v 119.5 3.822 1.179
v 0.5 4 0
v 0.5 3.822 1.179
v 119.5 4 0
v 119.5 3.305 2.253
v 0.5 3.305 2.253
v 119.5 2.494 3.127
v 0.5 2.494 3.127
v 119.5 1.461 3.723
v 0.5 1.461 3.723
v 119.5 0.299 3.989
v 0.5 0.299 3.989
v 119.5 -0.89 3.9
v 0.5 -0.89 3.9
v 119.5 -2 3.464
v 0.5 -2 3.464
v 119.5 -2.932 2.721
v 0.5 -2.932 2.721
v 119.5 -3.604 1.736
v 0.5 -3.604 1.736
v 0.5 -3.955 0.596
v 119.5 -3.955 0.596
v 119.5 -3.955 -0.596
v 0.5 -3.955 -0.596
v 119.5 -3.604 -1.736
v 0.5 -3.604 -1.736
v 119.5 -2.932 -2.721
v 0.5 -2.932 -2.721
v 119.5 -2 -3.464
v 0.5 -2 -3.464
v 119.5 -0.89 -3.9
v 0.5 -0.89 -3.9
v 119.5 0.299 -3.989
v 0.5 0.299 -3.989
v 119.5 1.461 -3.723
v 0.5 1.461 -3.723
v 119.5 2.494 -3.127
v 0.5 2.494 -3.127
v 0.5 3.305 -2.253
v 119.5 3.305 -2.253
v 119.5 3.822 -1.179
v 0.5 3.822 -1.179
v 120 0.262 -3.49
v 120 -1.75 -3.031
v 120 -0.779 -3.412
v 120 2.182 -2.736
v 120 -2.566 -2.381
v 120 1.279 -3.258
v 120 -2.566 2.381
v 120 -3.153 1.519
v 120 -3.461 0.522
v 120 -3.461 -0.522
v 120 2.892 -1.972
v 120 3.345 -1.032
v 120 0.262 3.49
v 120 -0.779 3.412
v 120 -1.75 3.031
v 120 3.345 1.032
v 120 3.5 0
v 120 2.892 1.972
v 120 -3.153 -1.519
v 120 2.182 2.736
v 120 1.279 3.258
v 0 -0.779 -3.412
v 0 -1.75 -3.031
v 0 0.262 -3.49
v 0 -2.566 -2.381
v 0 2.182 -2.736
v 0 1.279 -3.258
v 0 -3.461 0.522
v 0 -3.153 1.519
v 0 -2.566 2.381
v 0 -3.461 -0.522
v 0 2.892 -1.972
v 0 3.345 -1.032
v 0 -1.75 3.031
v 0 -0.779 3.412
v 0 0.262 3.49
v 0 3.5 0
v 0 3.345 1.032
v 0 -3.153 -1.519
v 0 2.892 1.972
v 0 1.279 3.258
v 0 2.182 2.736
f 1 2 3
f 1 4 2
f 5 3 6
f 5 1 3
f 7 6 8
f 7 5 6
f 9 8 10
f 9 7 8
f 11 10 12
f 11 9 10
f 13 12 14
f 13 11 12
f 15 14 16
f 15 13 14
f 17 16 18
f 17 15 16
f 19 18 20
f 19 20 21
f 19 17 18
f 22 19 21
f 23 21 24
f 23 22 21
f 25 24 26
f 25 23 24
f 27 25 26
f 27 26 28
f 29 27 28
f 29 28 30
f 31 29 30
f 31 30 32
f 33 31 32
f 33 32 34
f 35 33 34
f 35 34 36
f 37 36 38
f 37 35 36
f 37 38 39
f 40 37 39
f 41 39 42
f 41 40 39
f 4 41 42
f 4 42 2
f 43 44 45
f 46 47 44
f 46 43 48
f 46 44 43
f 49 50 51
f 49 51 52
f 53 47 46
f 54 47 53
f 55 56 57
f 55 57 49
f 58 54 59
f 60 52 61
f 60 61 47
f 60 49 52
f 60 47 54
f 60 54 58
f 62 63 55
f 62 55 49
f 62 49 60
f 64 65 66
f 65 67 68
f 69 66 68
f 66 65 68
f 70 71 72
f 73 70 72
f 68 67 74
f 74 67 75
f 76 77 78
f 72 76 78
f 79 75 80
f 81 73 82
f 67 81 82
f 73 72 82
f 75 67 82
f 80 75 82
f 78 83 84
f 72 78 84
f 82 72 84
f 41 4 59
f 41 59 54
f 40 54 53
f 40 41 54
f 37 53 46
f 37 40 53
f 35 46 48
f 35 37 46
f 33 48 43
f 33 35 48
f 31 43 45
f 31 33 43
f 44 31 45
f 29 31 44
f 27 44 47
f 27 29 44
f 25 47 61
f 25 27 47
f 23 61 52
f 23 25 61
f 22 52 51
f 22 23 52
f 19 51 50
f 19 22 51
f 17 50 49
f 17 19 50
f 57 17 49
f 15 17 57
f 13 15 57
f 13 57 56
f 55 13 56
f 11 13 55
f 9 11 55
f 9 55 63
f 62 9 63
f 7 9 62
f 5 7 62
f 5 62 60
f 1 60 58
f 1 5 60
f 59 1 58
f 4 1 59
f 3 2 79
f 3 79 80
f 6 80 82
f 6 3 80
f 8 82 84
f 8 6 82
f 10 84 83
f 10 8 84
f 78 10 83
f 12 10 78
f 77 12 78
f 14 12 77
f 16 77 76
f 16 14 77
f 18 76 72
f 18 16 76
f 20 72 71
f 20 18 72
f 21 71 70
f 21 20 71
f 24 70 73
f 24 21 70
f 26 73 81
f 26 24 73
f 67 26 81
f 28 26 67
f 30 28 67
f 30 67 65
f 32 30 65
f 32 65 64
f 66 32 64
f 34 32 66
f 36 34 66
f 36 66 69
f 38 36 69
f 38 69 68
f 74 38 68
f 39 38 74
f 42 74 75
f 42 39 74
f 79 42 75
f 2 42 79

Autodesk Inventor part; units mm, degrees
ref_plane "Startebene" through (0, 0, 0) normal (1, 0, 0) x (0, 1, 0)
ref_plane "XZ Plane" through (0, 0, 0) normal (0, 1, 0) x (-1, 0, 0)
ref_plane "XY Plane" through (0, 0, 0) normal (0, 0, 1) x (1, 0, 0)
sketch "Hauptskizze" plane through (0, 0, 0) normal (0, 0, 1) x (1, 0, 0)
  line L0 (0, 0) -> (120, 0)
  line L1 (0, 0) -> (0, 4)
  line L2 (120, 4) -> (120, 0)
  line L3 (0, 4) -> (120, 4)
  dimension "d3" = 8
revolve "Umdrehung1" add sketch "Hauptskizze" angle 360 about axis through (0, 0, 0) along (1, 0, 0)
chamfer "Fase3" distance 0.5 angle 45 1 edges at (0, -4, 0) measured on face at (80, 3.987, -0.3219)
chamfer "Fase2" distance 0.5 angle 45 1 edges at (120, -4, 0) measured on face at (80.1667, 3.987, -0.3219)
properties part number "Welle 8x120mm" material "Steel"
